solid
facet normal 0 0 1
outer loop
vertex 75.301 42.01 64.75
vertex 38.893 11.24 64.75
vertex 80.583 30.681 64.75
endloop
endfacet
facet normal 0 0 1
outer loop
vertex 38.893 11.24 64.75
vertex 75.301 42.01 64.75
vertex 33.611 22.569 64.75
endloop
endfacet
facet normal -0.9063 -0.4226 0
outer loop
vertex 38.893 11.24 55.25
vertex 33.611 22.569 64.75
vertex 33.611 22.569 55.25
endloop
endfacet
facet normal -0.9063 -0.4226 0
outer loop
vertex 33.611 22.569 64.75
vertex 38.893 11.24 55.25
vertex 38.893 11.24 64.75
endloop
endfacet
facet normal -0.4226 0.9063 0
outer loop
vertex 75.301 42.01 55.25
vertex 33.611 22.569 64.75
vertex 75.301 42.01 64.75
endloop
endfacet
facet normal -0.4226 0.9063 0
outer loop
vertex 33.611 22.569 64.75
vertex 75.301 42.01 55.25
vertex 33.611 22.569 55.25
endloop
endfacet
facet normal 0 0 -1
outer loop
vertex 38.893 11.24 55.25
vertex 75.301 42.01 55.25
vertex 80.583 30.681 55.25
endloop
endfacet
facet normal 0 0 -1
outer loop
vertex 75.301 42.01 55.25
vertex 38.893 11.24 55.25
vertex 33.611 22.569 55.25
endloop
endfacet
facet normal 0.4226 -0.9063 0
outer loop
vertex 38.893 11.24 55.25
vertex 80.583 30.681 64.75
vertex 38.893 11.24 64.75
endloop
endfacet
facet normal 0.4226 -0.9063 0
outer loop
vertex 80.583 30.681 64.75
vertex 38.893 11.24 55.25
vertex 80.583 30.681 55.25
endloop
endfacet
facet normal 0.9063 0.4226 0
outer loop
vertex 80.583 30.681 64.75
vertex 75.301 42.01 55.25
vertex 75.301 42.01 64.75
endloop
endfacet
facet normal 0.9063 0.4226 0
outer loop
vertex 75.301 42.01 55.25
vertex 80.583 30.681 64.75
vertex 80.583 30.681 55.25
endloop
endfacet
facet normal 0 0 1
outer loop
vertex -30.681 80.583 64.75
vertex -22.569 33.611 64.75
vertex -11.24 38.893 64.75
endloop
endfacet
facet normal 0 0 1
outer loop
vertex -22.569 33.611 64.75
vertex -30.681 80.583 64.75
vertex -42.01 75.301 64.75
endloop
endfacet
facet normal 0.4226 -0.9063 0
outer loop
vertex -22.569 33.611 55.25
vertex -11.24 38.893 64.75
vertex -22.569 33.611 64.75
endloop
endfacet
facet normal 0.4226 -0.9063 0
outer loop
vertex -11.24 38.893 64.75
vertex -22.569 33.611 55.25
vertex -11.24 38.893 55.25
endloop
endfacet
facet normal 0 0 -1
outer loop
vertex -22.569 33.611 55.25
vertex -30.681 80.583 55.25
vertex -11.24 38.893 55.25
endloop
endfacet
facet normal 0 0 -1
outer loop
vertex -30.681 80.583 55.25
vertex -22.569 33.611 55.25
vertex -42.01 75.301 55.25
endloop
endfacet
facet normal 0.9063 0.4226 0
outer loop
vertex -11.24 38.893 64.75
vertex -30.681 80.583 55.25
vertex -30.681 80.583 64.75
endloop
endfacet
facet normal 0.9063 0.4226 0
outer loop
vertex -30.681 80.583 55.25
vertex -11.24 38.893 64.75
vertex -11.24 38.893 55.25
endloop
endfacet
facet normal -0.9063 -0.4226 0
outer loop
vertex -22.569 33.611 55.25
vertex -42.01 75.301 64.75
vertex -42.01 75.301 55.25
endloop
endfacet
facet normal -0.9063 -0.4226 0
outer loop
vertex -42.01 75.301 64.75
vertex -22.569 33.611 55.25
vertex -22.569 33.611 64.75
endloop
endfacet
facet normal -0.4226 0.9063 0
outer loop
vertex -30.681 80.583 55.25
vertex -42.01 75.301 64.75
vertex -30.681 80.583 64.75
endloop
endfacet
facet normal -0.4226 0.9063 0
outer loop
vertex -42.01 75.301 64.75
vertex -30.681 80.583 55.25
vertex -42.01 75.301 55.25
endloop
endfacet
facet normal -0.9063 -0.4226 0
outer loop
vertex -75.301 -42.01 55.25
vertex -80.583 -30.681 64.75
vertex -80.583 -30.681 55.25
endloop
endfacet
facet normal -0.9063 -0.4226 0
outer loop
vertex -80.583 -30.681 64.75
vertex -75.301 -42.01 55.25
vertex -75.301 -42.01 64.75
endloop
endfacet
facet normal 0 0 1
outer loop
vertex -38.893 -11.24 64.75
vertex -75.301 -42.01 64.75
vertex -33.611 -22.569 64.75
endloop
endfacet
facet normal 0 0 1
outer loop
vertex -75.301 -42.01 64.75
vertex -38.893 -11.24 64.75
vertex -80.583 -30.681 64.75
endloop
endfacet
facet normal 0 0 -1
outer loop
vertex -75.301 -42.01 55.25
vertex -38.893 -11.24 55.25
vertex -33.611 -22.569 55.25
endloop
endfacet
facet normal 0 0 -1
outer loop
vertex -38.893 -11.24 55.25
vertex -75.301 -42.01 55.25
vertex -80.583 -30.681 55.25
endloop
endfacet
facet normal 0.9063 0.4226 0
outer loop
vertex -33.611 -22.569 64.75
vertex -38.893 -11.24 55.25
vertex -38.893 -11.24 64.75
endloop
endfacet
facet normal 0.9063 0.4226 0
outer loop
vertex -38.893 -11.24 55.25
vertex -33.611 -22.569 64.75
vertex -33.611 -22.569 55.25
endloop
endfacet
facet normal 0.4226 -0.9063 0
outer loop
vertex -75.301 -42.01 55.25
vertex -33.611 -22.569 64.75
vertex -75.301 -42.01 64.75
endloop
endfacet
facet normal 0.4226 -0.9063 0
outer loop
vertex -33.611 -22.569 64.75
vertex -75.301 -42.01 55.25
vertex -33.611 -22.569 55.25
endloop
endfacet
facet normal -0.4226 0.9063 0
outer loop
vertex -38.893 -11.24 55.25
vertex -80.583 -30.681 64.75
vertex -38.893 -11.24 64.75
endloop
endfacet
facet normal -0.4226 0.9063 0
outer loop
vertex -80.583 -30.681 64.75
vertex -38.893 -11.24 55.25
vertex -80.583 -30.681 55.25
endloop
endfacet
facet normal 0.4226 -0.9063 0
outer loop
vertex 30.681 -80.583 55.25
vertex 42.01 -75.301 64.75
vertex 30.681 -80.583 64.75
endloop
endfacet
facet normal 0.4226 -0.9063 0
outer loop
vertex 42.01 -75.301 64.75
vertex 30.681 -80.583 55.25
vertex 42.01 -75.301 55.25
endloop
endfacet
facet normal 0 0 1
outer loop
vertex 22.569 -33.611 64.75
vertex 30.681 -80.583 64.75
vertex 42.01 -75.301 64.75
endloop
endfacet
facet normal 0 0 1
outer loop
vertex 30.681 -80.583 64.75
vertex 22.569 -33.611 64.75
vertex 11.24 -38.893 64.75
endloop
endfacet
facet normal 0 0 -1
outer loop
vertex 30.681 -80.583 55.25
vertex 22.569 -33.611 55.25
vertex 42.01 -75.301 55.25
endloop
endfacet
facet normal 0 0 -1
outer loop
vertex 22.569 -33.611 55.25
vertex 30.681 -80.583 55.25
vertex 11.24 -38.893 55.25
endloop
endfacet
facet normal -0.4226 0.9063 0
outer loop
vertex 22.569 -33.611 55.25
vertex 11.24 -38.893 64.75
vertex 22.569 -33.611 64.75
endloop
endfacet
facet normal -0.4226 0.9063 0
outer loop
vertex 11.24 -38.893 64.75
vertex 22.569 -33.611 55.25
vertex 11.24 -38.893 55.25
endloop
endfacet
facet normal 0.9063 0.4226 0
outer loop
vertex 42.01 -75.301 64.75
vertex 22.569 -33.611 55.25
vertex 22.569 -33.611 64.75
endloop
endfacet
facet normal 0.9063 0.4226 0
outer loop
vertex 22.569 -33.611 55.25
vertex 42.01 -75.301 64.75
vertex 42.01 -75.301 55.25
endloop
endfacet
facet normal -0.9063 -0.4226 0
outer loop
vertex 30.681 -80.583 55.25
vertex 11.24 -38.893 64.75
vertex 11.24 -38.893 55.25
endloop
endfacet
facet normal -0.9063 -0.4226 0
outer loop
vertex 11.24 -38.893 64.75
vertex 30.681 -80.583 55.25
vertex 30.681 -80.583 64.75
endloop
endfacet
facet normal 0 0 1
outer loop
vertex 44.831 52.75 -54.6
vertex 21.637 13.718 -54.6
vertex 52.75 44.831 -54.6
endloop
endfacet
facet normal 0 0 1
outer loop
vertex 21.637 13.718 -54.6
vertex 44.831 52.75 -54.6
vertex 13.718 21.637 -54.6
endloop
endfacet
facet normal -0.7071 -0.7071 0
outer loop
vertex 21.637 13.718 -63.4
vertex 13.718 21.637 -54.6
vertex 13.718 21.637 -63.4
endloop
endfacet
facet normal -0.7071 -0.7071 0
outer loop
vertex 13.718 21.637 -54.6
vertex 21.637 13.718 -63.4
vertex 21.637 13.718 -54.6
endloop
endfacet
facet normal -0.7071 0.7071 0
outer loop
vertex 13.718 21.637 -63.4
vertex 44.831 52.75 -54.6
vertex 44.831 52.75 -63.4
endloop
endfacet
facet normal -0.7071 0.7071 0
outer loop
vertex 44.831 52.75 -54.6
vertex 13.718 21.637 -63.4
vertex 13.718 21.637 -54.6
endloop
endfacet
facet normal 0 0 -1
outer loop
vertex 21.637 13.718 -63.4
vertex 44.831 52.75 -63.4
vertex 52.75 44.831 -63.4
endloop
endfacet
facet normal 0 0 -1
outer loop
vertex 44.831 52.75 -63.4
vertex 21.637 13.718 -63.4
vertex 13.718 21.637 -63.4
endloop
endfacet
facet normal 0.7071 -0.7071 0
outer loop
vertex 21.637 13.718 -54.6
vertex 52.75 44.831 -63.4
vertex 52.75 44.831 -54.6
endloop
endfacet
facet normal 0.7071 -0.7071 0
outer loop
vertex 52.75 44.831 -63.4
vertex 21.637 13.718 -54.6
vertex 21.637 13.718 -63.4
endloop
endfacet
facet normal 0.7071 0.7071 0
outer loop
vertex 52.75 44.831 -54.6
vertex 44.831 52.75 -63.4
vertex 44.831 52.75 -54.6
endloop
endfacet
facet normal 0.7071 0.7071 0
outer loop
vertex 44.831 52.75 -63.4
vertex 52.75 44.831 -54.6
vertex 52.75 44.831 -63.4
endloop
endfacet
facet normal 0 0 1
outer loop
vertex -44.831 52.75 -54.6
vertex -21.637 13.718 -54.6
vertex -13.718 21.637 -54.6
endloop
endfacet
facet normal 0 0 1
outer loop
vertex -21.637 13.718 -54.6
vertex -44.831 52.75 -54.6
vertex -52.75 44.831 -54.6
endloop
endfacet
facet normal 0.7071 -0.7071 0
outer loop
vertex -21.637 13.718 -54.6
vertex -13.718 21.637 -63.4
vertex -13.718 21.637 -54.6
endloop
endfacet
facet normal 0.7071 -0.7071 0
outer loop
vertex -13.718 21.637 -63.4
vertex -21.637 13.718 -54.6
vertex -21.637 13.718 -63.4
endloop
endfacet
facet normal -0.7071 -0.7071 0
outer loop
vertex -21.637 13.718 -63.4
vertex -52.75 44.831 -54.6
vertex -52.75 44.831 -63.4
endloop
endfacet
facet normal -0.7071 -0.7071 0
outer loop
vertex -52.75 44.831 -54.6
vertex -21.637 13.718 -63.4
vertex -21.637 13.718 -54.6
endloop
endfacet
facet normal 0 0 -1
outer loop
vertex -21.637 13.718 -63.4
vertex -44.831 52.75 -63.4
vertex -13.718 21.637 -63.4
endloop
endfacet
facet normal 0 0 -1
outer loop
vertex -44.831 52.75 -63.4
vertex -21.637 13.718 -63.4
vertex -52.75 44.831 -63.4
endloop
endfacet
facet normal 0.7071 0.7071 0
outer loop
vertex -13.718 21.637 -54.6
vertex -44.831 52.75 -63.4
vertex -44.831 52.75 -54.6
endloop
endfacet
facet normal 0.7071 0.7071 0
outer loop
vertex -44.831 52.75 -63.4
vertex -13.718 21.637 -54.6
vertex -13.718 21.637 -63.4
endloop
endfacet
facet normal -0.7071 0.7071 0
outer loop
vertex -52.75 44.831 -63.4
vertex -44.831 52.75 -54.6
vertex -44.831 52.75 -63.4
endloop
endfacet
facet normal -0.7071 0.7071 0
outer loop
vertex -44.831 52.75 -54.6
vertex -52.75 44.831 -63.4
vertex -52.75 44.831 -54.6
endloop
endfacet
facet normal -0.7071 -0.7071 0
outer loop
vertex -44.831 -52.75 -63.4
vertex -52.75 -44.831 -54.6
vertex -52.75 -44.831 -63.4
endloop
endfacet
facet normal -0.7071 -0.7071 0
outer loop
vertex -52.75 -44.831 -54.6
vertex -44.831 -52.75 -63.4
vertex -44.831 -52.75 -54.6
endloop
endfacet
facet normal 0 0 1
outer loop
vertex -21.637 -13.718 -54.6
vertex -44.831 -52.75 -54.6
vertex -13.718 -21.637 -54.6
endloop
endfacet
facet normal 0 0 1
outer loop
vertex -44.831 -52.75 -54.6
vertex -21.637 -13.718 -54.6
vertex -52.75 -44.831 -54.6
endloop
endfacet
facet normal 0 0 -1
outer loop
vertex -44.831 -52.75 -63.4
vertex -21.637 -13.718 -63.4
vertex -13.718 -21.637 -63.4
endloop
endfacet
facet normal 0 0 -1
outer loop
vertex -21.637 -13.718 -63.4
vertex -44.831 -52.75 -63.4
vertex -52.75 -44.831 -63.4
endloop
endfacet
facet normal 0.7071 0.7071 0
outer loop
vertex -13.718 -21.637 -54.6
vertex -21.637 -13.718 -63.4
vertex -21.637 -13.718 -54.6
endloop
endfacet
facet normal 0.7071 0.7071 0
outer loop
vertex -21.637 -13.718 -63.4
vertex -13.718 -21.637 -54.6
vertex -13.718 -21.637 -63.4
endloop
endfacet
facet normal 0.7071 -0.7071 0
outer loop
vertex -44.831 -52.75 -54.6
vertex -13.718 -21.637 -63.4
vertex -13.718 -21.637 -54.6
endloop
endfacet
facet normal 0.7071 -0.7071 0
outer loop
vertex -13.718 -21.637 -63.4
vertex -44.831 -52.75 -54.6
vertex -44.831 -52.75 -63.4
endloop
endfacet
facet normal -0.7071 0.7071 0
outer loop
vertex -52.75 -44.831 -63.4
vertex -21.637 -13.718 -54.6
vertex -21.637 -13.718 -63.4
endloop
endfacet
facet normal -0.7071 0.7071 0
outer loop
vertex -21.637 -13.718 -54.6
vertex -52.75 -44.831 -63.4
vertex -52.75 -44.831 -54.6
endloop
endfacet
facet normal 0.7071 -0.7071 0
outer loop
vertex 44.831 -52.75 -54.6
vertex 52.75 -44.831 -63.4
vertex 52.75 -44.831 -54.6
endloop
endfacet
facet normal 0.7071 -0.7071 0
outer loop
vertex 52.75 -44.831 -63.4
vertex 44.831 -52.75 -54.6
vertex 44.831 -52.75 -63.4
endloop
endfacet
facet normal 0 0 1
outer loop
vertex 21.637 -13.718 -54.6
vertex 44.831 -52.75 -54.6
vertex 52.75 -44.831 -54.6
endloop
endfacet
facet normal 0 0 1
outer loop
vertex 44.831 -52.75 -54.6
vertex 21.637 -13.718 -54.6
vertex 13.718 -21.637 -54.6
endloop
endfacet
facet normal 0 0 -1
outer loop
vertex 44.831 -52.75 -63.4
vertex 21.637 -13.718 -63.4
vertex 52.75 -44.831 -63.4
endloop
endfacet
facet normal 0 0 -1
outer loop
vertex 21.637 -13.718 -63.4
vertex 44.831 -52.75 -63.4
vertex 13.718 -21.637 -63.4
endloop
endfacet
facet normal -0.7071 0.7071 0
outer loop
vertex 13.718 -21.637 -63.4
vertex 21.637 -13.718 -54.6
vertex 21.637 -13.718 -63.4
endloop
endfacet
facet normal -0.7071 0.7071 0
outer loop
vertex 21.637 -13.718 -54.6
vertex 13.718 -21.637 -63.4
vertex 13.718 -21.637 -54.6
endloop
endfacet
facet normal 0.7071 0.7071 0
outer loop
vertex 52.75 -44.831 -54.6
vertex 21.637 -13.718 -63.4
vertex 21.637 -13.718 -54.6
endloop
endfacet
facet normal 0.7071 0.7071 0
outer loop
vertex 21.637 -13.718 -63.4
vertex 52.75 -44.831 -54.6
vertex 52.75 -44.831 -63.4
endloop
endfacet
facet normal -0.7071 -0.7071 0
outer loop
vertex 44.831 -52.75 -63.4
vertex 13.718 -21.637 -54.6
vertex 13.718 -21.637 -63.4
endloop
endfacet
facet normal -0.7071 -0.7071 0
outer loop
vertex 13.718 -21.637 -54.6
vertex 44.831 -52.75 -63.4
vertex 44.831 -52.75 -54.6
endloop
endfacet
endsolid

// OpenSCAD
// ============================================================================
// Atom Lithography Machine — Parametric OpenSCAD Module (S6.1-03)
// ============================================================================
// part_id           : S6.1-03
// parent_bom_id     : S6.1
// subsystem         : S6
// part_name         : Titresim-ayrisik orgulu OFHC bakir termal baglanti seritleri (50K/4K)
// material          : OFHC Cu
// temp_stage        : 50 K / 4 K
// vacuum_grade      : Kriyo-vakum
// tolerance         : <0.1 K/W
// computed_mass_kg  : 0.09179
// envelope_mm       : 161.168 x 161.168 x 132.774
// design_maturity   : M0_M1_DETAILED_CAD_DESIGN_ONLY
// no_lab_measurement: true
// iec61508_certified: false
// semi_s2_certified : false
// Units: millimeters (mm)
// ============================================================================

$fn = 64;

// Nominal bounding envelope parameters (mm)
bbox_x = 161.1677;
bbox_y = 161.1677;
bbox_z = 132.7737;

// Part-specific parametric dimensions
n_braids_50k = 4;
n_braids_4k = 4;
rrr_min = 200;

// Interface / port parameters (mm)
port_pt420_45k_ring_od = 170.000;
port_pt420_4k_ring_od = 138.000;

module part_S6_1_03() {
  union() {
    // 50K OFHC thermal braid #1
    translate([57.097, 26.625, 60.000]) rotate([0.000, 0.000, 25.000]) cube([46.000, 12.500, 9.500], center=true);
    // 50K OFHC thermal braid #2
    translate([-26.625, 57.097, 60.000]) rotate([0.000, 0.000, 115.000]) cube([46.000, 12.500, 9.500], center=true);
    // 50K OFHC thermal braid #3
    translate([-57.097, -26.625, 60.000]) rotate([0.000, 0.000, 205.000]) cube([46.000, 12.500, 9.500], center=true);
    // 50K OFHC thermal braid #4
    translate([26.625, -57.097, 60.000]) rotate([0.000, 0.000, 295.000]) cube([46.000, 12.500, 9.500], center=true);
    // 4K OFHC thermal braid #1
    translate([33.234, 33.234, -59.000]) rotate([0.000, 0.000, 45.000]) cube([44.000, 11.200, 8.800], center=true);
    // 4K OFHC thermal braid #2
    translate([-33.234, 33.234, -59.000]) rotate([0.000, 0.000, 135.000]) cube([44.000, 11.200, 8.800], center=true);
    // 4K OFHC thermal braid #3
    translate([-33.234, -33.234, -59.000]) rotate([0.000, 0.000, 225.000]) cube([44.000, 11.200, 8.800], center=true);
    // 4K OFHC thermal braid #4
    translate([33.234, -33.234, -59.000]) rotate([0.000, 0.000, 315.000]) cube([44.000, 11.200, 8.800], center=true);
  }
}

// World assembly mounting transform (global machine frame, mm / deg):
// translate([-650.000, 0.000, 802.000]) rotate([0.000, 0.000, 0.000]) part_S6_1_03();

part_S6_1_03();
